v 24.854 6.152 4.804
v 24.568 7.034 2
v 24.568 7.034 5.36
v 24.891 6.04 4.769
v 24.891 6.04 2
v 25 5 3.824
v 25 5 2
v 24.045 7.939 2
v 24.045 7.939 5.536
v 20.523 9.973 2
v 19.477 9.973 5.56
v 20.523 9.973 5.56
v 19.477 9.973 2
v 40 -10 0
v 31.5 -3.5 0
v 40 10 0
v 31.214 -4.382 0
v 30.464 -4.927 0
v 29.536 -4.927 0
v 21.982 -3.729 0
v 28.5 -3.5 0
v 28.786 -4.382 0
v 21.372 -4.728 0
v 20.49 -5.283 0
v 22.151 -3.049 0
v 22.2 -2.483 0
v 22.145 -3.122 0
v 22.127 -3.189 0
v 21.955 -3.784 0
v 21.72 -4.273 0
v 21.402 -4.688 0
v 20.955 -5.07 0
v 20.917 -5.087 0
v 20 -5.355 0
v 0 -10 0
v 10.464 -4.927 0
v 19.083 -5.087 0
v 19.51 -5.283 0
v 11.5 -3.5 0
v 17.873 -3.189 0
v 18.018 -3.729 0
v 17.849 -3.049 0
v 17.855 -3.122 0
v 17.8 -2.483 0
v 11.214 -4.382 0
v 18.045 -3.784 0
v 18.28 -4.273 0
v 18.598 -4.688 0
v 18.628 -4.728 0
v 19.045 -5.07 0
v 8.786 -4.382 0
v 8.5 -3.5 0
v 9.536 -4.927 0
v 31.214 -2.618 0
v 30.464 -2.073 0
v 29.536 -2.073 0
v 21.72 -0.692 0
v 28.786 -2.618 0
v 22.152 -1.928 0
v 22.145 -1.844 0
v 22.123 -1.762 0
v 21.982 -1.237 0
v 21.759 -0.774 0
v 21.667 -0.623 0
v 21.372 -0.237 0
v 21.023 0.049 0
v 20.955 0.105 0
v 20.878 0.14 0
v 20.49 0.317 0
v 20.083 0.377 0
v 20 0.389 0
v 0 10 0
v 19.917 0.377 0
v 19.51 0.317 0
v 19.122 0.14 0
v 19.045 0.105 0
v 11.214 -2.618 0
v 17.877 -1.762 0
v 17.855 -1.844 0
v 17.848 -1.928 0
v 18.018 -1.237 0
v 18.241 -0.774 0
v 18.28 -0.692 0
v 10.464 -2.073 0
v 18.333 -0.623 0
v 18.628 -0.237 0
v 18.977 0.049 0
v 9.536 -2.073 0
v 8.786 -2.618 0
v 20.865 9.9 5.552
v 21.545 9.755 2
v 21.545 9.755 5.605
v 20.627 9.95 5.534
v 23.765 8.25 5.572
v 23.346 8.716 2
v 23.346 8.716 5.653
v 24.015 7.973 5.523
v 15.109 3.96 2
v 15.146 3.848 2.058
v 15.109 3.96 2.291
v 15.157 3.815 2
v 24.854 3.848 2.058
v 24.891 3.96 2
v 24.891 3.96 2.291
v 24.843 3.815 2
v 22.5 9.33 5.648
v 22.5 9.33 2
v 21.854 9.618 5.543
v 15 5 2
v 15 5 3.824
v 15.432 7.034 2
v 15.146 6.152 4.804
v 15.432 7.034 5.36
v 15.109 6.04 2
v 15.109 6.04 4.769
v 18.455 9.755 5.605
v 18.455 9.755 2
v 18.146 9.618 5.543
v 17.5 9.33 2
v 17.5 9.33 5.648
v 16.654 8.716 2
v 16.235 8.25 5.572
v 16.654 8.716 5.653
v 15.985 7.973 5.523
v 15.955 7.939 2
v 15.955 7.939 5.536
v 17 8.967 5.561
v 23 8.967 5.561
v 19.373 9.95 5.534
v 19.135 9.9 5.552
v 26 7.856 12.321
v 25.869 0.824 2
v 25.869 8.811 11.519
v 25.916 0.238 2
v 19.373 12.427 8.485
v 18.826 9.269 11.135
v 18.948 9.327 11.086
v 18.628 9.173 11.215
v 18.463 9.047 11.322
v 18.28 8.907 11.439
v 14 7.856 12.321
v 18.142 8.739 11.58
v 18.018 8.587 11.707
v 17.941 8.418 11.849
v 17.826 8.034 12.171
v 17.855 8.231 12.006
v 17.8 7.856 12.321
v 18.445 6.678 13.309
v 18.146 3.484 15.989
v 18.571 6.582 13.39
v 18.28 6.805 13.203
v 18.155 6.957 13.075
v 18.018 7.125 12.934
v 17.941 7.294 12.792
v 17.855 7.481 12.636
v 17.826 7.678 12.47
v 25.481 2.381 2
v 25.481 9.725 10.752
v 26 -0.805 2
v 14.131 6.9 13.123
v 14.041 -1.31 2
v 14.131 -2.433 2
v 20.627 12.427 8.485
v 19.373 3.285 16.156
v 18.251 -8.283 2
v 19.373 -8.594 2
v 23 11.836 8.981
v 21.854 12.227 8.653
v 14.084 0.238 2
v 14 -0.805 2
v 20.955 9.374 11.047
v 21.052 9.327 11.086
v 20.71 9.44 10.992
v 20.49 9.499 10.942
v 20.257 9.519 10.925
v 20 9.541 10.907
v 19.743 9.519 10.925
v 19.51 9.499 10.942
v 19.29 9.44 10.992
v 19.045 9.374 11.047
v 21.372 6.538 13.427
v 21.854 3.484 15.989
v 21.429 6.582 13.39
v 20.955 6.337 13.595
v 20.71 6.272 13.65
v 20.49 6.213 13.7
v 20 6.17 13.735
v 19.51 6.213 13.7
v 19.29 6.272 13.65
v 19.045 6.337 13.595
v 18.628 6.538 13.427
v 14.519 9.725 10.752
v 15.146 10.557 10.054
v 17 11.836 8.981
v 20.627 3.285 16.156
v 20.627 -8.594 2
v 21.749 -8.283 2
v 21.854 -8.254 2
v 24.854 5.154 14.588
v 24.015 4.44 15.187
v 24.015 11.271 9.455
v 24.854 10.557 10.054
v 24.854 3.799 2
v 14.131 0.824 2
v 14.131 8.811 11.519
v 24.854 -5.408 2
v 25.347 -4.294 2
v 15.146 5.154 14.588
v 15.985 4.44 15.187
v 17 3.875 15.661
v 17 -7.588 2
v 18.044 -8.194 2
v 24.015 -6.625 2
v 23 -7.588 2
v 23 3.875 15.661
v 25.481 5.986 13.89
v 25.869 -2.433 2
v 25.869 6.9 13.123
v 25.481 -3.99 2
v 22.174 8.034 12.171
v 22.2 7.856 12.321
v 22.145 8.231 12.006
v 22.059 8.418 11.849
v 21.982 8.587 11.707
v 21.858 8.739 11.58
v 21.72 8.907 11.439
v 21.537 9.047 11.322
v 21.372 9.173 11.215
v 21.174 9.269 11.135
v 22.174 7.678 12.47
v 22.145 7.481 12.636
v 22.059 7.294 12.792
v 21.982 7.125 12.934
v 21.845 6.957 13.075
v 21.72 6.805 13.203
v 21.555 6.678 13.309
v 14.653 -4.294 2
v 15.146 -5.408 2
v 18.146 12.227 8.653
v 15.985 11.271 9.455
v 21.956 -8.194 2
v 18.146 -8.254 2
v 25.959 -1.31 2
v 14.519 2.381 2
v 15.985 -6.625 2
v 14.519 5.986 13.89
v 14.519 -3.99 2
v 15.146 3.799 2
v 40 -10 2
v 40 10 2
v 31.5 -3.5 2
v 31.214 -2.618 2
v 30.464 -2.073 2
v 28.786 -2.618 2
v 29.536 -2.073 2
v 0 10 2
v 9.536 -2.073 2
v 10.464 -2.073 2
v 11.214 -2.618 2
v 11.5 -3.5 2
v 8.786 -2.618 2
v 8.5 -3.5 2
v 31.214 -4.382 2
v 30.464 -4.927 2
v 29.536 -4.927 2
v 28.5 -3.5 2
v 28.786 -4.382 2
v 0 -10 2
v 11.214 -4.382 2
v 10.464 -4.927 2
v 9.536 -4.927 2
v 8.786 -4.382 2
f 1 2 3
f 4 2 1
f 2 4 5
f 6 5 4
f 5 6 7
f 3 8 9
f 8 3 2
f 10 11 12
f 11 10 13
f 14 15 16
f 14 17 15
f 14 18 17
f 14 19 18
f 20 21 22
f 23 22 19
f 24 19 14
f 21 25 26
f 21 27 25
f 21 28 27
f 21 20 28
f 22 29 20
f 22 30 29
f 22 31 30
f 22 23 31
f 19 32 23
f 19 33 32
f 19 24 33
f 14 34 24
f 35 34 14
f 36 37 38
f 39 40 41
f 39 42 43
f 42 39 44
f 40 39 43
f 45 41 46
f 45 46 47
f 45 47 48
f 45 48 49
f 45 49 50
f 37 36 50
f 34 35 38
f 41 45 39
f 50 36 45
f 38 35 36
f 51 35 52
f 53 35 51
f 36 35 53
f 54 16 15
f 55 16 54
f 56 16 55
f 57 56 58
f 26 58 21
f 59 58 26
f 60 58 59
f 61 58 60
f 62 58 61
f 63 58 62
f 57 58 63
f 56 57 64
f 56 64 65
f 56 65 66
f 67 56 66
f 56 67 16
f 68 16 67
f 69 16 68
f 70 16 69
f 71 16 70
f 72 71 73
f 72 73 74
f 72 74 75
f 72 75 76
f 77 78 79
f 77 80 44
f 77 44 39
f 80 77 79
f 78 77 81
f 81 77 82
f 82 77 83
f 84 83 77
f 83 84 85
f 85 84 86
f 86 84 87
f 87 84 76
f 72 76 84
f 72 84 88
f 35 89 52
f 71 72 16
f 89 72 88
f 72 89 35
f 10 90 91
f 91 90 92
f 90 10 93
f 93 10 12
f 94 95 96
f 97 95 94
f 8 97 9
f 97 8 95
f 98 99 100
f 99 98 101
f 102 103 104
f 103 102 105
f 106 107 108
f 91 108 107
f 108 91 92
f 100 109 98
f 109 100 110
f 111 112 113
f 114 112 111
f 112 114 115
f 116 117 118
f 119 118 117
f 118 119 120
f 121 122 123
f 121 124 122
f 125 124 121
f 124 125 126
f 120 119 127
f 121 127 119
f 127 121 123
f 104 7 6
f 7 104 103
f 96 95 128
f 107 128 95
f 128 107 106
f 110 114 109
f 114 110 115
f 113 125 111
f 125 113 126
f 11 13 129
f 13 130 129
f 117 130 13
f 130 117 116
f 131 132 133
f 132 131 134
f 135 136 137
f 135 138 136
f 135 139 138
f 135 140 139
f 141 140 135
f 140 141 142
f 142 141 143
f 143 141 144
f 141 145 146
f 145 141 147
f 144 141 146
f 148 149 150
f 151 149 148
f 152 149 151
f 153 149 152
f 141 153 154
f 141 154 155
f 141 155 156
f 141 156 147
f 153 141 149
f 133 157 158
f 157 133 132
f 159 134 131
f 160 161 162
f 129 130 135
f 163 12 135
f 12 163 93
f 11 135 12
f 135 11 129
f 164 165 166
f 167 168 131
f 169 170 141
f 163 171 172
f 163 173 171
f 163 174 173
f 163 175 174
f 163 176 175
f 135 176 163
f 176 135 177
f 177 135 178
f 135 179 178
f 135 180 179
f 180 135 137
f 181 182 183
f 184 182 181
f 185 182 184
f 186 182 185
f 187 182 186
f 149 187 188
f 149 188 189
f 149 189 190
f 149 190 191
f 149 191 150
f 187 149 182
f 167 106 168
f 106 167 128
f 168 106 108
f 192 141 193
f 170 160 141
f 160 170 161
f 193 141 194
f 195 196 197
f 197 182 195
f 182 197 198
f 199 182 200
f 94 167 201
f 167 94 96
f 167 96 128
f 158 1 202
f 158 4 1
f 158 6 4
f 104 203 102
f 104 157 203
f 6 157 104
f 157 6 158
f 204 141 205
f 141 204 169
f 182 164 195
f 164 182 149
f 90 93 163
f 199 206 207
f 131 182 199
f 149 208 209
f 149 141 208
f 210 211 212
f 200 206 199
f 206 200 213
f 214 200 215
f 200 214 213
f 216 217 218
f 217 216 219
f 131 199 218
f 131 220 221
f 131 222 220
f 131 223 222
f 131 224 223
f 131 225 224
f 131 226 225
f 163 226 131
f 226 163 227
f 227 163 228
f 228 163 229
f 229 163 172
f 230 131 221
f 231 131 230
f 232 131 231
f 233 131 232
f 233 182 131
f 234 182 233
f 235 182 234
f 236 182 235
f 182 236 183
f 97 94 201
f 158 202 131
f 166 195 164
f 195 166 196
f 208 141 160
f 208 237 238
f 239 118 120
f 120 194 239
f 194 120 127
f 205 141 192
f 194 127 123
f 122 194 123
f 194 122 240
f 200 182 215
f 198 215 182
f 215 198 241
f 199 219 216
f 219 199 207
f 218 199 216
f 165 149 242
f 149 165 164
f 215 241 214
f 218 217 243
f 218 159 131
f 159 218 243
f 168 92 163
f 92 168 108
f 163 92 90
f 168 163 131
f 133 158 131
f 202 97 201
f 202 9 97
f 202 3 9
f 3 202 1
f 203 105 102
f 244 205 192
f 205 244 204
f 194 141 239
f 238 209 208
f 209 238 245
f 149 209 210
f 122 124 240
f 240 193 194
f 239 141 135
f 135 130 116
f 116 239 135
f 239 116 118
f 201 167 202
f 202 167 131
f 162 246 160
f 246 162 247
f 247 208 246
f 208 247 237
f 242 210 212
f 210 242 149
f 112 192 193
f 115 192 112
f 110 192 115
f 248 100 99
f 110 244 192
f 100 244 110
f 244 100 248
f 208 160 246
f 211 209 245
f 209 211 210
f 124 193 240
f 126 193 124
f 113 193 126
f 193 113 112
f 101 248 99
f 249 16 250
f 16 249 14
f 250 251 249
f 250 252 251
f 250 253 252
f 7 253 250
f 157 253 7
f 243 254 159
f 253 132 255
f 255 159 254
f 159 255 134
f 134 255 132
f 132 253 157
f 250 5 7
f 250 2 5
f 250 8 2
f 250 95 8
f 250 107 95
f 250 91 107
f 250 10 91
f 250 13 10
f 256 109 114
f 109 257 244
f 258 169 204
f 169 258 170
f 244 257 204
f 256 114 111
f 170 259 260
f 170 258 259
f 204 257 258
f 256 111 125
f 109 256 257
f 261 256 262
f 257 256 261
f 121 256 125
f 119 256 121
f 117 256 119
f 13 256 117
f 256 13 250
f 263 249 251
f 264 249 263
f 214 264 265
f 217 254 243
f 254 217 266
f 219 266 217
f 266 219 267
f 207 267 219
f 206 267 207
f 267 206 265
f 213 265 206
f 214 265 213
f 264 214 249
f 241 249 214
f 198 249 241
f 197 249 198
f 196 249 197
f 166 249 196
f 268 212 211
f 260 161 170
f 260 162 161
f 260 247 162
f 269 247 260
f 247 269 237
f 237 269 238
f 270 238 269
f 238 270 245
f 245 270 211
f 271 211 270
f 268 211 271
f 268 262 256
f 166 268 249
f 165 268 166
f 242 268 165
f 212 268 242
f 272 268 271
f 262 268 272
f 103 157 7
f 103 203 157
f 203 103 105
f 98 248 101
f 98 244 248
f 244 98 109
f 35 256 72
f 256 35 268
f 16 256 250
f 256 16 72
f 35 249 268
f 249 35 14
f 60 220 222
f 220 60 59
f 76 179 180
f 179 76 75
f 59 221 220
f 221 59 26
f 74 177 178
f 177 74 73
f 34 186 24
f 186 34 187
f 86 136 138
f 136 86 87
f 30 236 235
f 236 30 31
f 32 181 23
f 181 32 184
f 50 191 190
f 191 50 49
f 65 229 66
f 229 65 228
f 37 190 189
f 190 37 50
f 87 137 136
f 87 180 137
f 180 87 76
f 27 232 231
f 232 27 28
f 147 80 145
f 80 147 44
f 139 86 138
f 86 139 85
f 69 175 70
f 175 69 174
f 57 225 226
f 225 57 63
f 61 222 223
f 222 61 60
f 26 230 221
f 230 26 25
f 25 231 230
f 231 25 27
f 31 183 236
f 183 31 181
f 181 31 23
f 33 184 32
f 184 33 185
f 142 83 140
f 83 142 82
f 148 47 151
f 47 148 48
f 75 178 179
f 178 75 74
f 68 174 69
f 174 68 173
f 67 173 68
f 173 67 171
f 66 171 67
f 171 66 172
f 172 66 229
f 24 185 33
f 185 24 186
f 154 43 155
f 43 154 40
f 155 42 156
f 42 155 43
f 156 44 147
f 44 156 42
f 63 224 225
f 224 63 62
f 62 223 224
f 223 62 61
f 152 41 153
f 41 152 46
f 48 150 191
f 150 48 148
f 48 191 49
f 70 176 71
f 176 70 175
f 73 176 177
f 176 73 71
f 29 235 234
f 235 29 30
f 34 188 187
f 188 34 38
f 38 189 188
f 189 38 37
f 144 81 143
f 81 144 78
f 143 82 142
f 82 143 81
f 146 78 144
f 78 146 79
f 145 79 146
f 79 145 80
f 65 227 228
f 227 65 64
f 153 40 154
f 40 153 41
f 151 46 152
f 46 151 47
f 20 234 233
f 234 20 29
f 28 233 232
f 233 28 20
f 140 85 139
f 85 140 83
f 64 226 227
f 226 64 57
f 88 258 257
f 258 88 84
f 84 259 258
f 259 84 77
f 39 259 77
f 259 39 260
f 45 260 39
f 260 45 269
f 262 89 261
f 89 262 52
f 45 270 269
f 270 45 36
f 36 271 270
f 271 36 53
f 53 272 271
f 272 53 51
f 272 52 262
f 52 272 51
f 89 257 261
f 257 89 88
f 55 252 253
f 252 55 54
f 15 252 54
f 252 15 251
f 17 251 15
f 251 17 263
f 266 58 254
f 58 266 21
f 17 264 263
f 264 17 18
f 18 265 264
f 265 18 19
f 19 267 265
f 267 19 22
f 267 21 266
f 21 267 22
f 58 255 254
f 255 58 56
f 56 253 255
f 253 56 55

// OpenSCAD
// skrewz@20170409:


// Notes to self: {{{
//$fa
// is the angle of the fragments. It sets the minimum angle for a fragment. Even
// a huge circle does not have more fragments than 360 divided by this number.
// The default value is 12 (i.e. 30 fragments for a full circle).
//$fs
// is the size of the fragments and defines the minimum size of a fragment.
// Because of this variable very small circles have a smaller number of
// fragments then specified using $fa. The default value is 1.
$fs = 1;
// is the number of fragments. It usually is 0. When this variable has a value
// greater than zero, the other two variables are ignored and full cirle is
// rendered using this number of fragments. The default value is 0.
// }}}


module attachment_plate()
{
  difference()
  {
    union() // positive parts:
    {
      translate([20,5,0])
        cylinder(r=5,h=10);

      translate([20,-5,-3])
      {
        rotate([-40,0,0])
          cylinder(r=6,h=20);
      }

      translate([0,-10,0])
        cube([40,20,2]);
    }
    union() // negative parts:
    {

      translate([20,-5,-3])
        rotate([-40,0,0])

      // hole for aluminium cylinder
      translate([0,0,-1])
        cylinder(r=2.2,h=40,$fs = 0.5);


      // holes for mounting
      translate([10,-3.5,-1])
        cylinder(r=1.5,h=3+2*1);
      translate([30,-3.5,-1])
        cylinder(r=1.5,h=3+2*1);

      // hole for cotton airseal
      //translate([20,-3.5,-0.01])
      //  cylinder(r1=3,r2=1,h=2);
    }
  }
}


difference()
{
  attachment_plate();

  translate([0,0,-10])
  cube([100,100,20],center=true);
}

// Production measurements:



// vim: ft=openscad fdm=marker fml=1 cindent
